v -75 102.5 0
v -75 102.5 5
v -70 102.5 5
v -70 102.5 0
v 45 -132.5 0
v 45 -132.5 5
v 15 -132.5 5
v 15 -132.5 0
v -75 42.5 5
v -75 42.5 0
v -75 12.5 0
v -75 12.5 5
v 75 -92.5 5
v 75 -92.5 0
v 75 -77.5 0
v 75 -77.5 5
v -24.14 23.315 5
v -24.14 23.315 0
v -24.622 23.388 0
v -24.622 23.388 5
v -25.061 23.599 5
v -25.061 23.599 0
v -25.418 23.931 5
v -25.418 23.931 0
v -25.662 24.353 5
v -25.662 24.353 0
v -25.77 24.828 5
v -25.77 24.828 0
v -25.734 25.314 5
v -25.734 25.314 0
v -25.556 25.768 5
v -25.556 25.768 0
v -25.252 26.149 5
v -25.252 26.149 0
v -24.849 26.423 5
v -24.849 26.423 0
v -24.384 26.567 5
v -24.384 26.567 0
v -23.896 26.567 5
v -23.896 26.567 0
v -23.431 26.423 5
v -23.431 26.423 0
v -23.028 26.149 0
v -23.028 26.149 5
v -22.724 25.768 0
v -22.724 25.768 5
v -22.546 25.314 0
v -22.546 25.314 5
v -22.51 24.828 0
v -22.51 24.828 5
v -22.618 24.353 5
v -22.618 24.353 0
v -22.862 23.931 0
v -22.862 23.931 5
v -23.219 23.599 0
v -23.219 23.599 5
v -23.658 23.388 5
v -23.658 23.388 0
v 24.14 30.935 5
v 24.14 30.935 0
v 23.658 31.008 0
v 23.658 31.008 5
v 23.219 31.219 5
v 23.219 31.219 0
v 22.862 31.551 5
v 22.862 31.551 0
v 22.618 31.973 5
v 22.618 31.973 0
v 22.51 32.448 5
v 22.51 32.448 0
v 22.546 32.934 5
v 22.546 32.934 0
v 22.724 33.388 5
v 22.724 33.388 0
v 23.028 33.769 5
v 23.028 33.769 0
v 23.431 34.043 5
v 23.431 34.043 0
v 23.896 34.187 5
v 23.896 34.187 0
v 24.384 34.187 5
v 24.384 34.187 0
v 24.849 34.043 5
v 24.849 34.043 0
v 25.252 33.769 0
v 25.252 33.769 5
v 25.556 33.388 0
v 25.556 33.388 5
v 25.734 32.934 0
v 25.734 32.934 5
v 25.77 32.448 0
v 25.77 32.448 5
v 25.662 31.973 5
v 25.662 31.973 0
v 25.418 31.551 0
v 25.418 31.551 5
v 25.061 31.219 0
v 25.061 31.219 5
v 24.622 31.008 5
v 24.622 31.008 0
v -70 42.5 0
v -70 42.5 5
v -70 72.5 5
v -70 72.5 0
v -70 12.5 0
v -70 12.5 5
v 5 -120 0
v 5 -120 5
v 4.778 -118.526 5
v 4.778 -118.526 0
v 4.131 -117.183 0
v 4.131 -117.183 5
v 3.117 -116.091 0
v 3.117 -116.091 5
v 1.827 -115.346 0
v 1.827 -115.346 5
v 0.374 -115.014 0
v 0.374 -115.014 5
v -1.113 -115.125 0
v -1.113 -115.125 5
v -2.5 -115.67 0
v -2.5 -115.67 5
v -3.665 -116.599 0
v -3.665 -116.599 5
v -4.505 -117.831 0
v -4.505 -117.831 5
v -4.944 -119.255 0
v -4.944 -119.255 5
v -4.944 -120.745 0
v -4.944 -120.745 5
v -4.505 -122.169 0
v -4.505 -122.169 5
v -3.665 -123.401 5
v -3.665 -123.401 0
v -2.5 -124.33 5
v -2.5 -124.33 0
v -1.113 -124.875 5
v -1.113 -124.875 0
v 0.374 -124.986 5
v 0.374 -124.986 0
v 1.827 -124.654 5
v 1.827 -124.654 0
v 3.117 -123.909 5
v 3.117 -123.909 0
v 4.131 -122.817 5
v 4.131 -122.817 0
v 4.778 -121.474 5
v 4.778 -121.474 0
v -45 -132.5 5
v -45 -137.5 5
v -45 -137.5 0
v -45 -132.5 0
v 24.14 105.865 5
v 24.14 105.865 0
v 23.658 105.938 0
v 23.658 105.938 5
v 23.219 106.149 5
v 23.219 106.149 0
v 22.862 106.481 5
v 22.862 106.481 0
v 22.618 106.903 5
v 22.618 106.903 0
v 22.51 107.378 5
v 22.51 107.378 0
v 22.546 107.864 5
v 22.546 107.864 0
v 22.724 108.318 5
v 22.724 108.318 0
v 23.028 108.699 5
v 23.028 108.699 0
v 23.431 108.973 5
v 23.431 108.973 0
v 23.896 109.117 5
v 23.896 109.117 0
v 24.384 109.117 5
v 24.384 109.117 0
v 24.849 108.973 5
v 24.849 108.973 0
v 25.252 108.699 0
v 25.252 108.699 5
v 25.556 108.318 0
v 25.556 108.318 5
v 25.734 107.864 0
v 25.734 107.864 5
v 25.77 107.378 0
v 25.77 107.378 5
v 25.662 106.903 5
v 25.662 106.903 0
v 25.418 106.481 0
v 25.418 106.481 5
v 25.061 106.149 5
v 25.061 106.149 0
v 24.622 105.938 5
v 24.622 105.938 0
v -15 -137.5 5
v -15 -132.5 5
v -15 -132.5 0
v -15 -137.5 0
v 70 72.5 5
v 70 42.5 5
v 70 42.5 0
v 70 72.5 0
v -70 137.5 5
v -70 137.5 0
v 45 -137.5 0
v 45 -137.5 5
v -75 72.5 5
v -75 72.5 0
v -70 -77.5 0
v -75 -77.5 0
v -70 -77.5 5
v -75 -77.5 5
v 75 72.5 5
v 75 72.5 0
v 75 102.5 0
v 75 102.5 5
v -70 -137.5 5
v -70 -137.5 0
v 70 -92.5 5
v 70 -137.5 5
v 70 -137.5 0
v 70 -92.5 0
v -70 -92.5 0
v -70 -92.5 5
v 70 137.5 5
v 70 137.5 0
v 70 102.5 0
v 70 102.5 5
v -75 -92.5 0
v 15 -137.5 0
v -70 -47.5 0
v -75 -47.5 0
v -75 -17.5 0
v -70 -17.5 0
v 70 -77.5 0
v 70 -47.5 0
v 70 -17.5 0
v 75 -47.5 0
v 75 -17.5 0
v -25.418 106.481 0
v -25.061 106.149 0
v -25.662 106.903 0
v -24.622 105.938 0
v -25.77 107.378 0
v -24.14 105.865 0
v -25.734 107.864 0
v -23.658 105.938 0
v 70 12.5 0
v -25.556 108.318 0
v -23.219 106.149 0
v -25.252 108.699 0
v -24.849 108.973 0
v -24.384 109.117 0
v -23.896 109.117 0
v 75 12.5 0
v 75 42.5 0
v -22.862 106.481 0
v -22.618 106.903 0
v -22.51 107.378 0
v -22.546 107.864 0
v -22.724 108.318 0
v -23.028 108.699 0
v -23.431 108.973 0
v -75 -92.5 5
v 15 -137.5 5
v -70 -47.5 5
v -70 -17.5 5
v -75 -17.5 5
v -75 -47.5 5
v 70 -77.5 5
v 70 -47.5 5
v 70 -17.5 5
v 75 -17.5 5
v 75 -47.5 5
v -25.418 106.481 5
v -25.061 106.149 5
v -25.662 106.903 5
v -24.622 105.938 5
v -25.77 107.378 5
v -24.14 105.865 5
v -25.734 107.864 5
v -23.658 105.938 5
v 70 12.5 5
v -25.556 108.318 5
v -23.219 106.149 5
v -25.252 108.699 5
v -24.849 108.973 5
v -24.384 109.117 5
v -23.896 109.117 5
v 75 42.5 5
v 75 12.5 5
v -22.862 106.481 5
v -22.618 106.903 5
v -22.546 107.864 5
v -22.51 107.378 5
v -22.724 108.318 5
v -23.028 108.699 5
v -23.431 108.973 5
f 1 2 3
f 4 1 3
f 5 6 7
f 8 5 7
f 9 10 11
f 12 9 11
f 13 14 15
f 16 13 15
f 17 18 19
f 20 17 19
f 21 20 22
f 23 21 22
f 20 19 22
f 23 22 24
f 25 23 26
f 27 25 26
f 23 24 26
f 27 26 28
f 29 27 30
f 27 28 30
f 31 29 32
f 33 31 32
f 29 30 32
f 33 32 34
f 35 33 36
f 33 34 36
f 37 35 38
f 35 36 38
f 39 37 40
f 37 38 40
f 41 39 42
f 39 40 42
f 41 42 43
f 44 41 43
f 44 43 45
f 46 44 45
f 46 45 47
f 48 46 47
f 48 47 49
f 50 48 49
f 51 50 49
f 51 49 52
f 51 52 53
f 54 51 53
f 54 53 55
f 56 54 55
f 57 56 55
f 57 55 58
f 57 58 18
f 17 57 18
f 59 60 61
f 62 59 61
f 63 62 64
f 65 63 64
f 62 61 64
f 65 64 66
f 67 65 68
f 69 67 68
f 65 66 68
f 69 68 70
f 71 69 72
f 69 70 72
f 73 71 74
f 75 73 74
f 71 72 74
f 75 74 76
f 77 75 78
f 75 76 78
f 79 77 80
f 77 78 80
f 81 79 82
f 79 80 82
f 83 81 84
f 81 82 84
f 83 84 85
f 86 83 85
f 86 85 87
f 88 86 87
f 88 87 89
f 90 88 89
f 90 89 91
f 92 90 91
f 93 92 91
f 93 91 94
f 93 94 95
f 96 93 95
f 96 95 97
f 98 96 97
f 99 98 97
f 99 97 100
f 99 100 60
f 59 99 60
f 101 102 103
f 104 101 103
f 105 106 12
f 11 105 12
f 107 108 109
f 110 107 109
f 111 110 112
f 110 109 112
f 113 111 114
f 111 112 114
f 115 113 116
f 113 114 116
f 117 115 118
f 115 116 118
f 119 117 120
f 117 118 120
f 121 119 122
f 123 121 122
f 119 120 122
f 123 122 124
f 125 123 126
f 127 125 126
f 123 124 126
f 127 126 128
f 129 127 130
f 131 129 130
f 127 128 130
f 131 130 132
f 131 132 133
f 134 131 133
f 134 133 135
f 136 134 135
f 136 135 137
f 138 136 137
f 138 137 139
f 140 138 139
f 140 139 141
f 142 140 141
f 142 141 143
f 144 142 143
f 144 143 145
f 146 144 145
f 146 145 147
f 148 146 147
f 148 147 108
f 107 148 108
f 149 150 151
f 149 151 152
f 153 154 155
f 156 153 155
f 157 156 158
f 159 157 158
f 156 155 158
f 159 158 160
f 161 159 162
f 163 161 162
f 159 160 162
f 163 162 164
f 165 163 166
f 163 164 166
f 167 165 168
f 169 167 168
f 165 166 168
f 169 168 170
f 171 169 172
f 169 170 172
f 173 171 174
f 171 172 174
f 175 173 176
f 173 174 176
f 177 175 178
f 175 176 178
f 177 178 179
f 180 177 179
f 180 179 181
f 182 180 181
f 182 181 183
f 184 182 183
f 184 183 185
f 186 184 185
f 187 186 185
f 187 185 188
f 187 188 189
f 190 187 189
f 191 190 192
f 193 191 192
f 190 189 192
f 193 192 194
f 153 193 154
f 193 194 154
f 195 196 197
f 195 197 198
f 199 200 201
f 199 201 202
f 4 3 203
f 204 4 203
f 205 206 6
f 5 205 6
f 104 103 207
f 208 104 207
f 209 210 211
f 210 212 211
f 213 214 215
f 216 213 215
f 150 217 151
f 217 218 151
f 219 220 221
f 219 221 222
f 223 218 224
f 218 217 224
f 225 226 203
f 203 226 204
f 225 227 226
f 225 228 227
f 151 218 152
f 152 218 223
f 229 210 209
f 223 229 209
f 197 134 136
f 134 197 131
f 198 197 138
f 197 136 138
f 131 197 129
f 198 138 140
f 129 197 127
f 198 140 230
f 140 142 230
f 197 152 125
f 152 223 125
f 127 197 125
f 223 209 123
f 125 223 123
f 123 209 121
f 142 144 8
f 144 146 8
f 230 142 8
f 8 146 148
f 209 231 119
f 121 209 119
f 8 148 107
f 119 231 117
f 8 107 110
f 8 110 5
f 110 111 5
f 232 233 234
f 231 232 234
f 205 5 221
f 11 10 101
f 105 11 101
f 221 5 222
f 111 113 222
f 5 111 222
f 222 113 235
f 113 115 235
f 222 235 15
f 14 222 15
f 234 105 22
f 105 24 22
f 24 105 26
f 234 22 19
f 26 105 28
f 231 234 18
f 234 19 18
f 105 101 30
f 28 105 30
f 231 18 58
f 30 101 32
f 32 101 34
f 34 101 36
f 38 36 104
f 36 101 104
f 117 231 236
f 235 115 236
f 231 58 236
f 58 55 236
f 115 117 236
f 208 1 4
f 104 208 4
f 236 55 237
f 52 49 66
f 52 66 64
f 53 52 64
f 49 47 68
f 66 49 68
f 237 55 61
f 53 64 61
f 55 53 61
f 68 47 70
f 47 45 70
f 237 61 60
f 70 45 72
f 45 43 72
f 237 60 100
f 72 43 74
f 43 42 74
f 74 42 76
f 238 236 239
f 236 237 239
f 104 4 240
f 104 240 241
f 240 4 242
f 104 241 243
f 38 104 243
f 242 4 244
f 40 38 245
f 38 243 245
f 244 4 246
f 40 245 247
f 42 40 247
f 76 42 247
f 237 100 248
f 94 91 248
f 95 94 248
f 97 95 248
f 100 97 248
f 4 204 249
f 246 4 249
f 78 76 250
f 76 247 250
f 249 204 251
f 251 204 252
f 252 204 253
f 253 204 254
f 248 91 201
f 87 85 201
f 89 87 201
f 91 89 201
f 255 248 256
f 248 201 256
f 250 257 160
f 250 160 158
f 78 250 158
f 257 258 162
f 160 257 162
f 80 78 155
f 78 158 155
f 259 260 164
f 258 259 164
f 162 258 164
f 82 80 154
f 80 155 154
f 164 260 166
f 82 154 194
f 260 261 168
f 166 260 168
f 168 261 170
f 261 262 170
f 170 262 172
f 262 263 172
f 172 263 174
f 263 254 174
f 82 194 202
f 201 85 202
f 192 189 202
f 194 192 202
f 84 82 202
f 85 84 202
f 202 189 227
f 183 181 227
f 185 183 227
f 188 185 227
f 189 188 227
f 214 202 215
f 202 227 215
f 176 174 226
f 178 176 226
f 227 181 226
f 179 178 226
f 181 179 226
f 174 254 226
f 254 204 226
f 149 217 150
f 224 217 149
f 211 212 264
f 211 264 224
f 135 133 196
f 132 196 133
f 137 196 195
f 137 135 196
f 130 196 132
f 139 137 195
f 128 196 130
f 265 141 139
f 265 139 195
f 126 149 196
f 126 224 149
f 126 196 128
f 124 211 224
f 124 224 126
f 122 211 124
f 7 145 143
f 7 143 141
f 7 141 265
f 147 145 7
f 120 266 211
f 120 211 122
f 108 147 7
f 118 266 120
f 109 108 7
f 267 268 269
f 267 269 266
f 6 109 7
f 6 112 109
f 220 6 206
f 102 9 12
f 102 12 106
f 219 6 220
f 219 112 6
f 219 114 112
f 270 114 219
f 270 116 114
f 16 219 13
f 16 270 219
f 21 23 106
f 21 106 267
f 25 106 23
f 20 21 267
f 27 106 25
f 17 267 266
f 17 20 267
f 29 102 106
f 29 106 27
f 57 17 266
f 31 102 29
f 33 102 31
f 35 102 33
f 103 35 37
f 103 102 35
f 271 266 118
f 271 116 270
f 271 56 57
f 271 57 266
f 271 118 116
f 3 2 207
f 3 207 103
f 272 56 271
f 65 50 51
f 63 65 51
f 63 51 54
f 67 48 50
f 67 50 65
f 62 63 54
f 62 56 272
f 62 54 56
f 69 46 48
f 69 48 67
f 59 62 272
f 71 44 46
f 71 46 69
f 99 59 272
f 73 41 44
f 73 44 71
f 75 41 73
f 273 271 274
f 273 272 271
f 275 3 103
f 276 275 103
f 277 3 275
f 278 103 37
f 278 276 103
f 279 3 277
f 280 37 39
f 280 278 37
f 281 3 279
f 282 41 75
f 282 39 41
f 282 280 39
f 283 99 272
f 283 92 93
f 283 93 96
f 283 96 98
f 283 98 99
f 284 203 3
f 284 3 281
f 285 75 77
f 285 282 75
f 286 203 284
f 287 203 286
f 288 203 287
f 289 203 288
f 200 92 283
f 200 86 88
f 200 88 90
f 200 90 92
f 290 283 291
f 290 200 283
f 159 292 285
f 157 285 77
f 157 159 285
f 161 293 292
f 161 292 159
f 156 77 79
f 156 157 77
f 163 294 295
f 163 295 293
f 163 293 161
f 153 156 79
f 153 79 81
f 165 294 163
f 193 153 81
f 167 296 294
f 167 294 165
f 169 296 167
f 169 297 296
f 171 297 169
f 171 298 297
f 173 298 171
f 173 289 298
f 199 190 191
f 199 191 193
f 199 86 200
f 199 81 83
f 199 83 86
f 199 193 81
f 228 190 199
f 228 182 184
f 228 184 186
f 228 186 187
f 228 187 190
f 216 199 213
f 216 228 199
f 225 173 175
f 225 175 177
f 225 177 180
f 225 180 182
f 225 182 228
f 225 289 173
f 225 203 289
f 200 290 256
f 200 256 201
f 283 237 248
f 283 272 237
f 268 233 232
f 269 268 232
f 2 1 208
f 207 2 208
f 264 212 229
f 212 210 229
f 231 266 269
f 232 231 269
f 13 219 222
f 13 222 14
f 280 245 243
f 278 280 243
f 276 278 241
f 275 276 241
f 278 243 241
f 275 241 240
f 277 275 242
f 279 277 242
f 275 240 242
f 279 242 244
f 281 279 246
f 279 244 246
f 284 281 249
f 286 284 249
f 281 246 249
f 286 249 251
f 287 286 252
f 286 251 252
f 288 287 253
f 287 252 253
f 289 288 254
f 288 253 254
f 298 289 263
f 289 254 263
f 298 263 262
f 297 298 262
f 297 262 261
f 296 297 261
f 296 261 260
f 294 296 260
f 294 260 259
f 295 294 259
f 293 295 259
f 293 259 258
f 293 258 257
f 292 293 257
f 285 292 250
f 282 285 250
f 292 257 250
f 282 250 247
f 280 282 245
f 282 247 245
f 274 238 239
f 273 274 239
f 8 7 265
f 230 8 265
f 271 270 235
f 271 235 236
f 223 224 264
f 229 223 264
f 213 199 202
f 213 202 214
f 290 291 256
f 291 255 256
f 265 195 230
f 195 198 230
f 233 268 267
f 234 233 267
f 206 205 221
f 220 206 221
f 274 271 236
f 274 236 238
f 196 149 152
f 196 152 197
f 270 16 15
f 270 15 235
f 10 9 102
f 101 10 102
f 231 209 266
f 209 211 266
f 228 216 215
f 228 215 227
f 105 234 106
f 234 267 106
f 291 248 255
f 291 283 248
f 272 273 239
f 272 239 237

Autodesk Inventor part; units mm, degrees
sketch "Sketch1" plane through (0, 0, 0) normal (0, 0, 1) x (1, 0, 0)
  line L0 (0, 2.8582) -> (0, -2.8582) construction
  line L1 (-5.7775, 0) -> (5.7775, 0) construction
  line L2 (-75, -137.5) -> (75, -137.5)
  line L3 (75, -137.5) -> (75, 137.5)
  line L4 (75, 137.5) -> (-75, 137.5)
  line L5 (-75, 137.5) -> (-75, -137.5)
  line L6 (-75, -137.5) -> (75, 137.5) construction
  line L7 (75, -137.5) -> (-75, 137.5) construction
  point P0 (0, 0)
  point P1 (0, 0)
  dimension "d0" = 150
  dimension "d1" = 275
extrude "Extrusion1" add sketch "Sketch1" along normal blind 5
sketch "Sketch2" plane through (0, 0, 5) normal (0, 0, 1) x (1, 0, 0)
  line L0 (0, 0) -> (0, -120)
  circle A0 centre (0, -120) radius 5
  line L1 (-75, 137.5) -> (-75, -137.5) projected
  line L2 (-75, -137.5) -> (-70, -137.5)
  line L3 (-70, -137.5) -> (-70, -92.5)
  line L4 (-70, -92.5) -> (-75, -92.5)
  line L5 (-75, -92.5) -> (-75, -137.5)
  line L6 (-75, -92.5) -> (-75, -77.5)
  line L7 (-75, -77.5) -> (-75, -47.5)
  line L8 (-75, -47.5) -> (-75, -17.5)
  line L9 (-75, -17.5) -> (-75, 12.5)
  line L10 (-75, 12.5) -> (-75, 42.5)
  line L11 (-75, 42.5) -> (-75, 72.5)
  line L12 (-75, 72.5) -> (-75, 102.5)
  line L13 (-75, 102.5) -> (-75, 132.5)
  line L14 (-75, -77.5) -> (-70, -77.5)
  line L15 (-70, -77.5) -> (-70, -47.5)
  line L16 (-70, -47.5) -> (-75, -47.5)
  line L17 (-75, -47.5) -> (-75, -77.5)
  line L18 (-75, -17.5) -> (-70, -17.5)
  line L19 (-70, -17.5) -> (-70, 12.5)
  line L20 (-70, 12.5) -> (-75, 12.5)
  line L21 (-75, 12.5) -> (-75, -17.5)
  line L22 (-75, 42.5) -> (-70, 42.5)
  line L23 (-70, 42.5) -> (-70, 72.5)
  line L24 (-70, 72.5) -> (-75, 72.5)
  line L25 (-75, 72.5) -> (-75, 42.5)
  line L26 (75, 137.5) -> (-75, 137.5) projected
  line L27 (-75, 102.5) -> (-70, 102.5)
  line L28 (-70, 102.5) -> (-70, 137.5)
  line L29 (-70, 137.5) -> (-75, 137.5)
  line L30 (-75, 137.5) -> (-75, 102.5)
  line L31 (75, -137.5) -> (75, 137.5) projected
  line L32 (75, -137.5) -> (75, -92.5)
  line L33 (75, -92.5) -> (75, -77.5)
  line L34 (75, -77.5) -> (75, -47.5)
  line L35 (75, -47.5) -> (75, -17.5)
  line L36 (75, -17.5) -> (75, 12.5)
  line L37 (75, 12.5) -> (75, 42.5)
  line L38 (75, 42.5) -> (75, 72.5)
  line L39 (75, 72.5) -> (75, 102.5)
  line L40 (75, 102.5) -> (75, 132.5)
  line L41 (-75, -137.5) -> (75, -137.5) projected
  line L42 (75, -137.5) -> (70, -137.5)
  line L43 (70, -137.5) -> (70, -92.5)
  line L44 (70, -92.5) -> (75, -92.5)
  line L45 (75, -92.5) -> (75, -137.5)
  line L46 (75, -77.5) -> (70, -77.5)
  line L47 (70, -77.5) -> (70, -47.5)
  line L48 (70, -47.5) -> (75, -47.5)
  line L49 (75, -47.5) -> (75, -77.5)
  line L50 (75, -17.5) -> (70, -17.5)
  line L51 (70, -17.5) -> (70, 12.5)
  line L52 (70, 12.5) -> (75, 12.5)
  line L53 (75, 12.5) -> (75, -17.5)
  line L54 (75, 42.5) -> (70, 42.5)
  line L55 (70, 42.5) -> (70, 72.5)
  line L56 (70, 72.5) -> (75, 72.5)
  line L57 (75, 72.5) -> (75, 42.5)
  line L58 (75, 102.5) -> (70, 102.5)
  line L59 (70, 102.5) -> (70, 137.5)
  line L60 (70, 137.5) -> (75, 137.5)
  line L61 (75, 137.5) -> (75, 102.5)
  line L62 (0, -137.5) -> (-15, -137.5)
  line L63 (-15, -137.5) -> (15, -137.5)
  line L64 (-15, -137.5) -> (-45, -137.5)
  line L65 (-45, -137.5) -> (-45, -132.5)
  line L66 (-45, -132.5) -> (-15, -132.5)
  line L67 (-15, -132.5) -> (-15, -137.5)
  line L68 (15, -137.5) -> (45, -137.5)
  line L69 (45, -137.5) -> (45, -132.5)
  line L70 (45, -132.5) -> (15, -132.5)
  line L71 (15, -132.5) -> (15, -137.5)
  point P0 (-75, -92.5)
  dimension "d4" = 120
  dimension "d5" = 10
  dimension "d6" = 5
  dimension "d7" = 45
  dimension "d9" = 30
  dimension "d10" = 30
  dimension "d11" = 30
  dimension "d12" = 30
  dimension "d13" = 30
  dimension "d14" = 30
  dimension "d15" = 30
  dimension "d16" = 5
  dimension "d17" = 30
  dimension "d18" = 5
  dimension "d19" = 5
  dimension "d20" = 5
  dimension "d21" = 45
  dimension "d23" = 30
  dimension "d24" = 30
  dimension "d25" = 30
  dimension "d26" = 30
  dimension "d27" = 30
  dimension "d28" = 30
  dimension "d29" = 30
  dimension "d30" = 5
  dimension "d31" = 5
  dimension "d32" = 15
  dimension "d33" = 30
  dimension "d34" = 30
  dimension "d35" = 5
  dimension "d36" = 30
  dimension "d37" = 5
  dimension "d40" = 45
extrude "Extrusion2" cut sketch "Sketch2" against normal blind 8 contours A0 | L26 L28 L27 L1 | L26 L31 L58 L59 | L24 L23 L22 L1 | L20 L19 L18 L1 | L31 L54 L55 L56 | L16 L15 L14 L1 | L31 L50 L51 L52 | L4 L3 L2 L1 | L31 L46 L47 L48 | L31 L41 L43 L44 | L65 L66 L67 L41 | L41 L71 L70 L69
sketch "Sketch3" plane through (0, 0, 5) normal (0, 0, 1) x (1, 0, 0)
  line L0 (70, 137.5) -> (-70, 137.5) projected
  line L1 (0, 137.5) -> (0, 107.5)
  line L2 (0, 107.5) -> (-24.14, 107.5)
  line L3 (0, 107.5) -> (24.14, 107.5)
  line L4 (24.14, 107.5) -> (24.14, 32.57)
  line L5 (-24.14, 107.5) -> (-24.14, 24.95)
  point P0 (0, 0)
  dimension "d42" = 30
  dimension "d43" = 24.14
  dimension "d44" = 24.14
  dimension "d45" = 74.93
  dimension "d46" = 82.55
hole "Hole1" at (-24.14, 24.95, 5) at (24.14, 32.57, 5) at (24.14, 107.5, 5) at (-24.14, 107.5, 5) direction (0, 0, -1) diameter 3.27 end through all
properties part number "Plaat boven" material "S235"
